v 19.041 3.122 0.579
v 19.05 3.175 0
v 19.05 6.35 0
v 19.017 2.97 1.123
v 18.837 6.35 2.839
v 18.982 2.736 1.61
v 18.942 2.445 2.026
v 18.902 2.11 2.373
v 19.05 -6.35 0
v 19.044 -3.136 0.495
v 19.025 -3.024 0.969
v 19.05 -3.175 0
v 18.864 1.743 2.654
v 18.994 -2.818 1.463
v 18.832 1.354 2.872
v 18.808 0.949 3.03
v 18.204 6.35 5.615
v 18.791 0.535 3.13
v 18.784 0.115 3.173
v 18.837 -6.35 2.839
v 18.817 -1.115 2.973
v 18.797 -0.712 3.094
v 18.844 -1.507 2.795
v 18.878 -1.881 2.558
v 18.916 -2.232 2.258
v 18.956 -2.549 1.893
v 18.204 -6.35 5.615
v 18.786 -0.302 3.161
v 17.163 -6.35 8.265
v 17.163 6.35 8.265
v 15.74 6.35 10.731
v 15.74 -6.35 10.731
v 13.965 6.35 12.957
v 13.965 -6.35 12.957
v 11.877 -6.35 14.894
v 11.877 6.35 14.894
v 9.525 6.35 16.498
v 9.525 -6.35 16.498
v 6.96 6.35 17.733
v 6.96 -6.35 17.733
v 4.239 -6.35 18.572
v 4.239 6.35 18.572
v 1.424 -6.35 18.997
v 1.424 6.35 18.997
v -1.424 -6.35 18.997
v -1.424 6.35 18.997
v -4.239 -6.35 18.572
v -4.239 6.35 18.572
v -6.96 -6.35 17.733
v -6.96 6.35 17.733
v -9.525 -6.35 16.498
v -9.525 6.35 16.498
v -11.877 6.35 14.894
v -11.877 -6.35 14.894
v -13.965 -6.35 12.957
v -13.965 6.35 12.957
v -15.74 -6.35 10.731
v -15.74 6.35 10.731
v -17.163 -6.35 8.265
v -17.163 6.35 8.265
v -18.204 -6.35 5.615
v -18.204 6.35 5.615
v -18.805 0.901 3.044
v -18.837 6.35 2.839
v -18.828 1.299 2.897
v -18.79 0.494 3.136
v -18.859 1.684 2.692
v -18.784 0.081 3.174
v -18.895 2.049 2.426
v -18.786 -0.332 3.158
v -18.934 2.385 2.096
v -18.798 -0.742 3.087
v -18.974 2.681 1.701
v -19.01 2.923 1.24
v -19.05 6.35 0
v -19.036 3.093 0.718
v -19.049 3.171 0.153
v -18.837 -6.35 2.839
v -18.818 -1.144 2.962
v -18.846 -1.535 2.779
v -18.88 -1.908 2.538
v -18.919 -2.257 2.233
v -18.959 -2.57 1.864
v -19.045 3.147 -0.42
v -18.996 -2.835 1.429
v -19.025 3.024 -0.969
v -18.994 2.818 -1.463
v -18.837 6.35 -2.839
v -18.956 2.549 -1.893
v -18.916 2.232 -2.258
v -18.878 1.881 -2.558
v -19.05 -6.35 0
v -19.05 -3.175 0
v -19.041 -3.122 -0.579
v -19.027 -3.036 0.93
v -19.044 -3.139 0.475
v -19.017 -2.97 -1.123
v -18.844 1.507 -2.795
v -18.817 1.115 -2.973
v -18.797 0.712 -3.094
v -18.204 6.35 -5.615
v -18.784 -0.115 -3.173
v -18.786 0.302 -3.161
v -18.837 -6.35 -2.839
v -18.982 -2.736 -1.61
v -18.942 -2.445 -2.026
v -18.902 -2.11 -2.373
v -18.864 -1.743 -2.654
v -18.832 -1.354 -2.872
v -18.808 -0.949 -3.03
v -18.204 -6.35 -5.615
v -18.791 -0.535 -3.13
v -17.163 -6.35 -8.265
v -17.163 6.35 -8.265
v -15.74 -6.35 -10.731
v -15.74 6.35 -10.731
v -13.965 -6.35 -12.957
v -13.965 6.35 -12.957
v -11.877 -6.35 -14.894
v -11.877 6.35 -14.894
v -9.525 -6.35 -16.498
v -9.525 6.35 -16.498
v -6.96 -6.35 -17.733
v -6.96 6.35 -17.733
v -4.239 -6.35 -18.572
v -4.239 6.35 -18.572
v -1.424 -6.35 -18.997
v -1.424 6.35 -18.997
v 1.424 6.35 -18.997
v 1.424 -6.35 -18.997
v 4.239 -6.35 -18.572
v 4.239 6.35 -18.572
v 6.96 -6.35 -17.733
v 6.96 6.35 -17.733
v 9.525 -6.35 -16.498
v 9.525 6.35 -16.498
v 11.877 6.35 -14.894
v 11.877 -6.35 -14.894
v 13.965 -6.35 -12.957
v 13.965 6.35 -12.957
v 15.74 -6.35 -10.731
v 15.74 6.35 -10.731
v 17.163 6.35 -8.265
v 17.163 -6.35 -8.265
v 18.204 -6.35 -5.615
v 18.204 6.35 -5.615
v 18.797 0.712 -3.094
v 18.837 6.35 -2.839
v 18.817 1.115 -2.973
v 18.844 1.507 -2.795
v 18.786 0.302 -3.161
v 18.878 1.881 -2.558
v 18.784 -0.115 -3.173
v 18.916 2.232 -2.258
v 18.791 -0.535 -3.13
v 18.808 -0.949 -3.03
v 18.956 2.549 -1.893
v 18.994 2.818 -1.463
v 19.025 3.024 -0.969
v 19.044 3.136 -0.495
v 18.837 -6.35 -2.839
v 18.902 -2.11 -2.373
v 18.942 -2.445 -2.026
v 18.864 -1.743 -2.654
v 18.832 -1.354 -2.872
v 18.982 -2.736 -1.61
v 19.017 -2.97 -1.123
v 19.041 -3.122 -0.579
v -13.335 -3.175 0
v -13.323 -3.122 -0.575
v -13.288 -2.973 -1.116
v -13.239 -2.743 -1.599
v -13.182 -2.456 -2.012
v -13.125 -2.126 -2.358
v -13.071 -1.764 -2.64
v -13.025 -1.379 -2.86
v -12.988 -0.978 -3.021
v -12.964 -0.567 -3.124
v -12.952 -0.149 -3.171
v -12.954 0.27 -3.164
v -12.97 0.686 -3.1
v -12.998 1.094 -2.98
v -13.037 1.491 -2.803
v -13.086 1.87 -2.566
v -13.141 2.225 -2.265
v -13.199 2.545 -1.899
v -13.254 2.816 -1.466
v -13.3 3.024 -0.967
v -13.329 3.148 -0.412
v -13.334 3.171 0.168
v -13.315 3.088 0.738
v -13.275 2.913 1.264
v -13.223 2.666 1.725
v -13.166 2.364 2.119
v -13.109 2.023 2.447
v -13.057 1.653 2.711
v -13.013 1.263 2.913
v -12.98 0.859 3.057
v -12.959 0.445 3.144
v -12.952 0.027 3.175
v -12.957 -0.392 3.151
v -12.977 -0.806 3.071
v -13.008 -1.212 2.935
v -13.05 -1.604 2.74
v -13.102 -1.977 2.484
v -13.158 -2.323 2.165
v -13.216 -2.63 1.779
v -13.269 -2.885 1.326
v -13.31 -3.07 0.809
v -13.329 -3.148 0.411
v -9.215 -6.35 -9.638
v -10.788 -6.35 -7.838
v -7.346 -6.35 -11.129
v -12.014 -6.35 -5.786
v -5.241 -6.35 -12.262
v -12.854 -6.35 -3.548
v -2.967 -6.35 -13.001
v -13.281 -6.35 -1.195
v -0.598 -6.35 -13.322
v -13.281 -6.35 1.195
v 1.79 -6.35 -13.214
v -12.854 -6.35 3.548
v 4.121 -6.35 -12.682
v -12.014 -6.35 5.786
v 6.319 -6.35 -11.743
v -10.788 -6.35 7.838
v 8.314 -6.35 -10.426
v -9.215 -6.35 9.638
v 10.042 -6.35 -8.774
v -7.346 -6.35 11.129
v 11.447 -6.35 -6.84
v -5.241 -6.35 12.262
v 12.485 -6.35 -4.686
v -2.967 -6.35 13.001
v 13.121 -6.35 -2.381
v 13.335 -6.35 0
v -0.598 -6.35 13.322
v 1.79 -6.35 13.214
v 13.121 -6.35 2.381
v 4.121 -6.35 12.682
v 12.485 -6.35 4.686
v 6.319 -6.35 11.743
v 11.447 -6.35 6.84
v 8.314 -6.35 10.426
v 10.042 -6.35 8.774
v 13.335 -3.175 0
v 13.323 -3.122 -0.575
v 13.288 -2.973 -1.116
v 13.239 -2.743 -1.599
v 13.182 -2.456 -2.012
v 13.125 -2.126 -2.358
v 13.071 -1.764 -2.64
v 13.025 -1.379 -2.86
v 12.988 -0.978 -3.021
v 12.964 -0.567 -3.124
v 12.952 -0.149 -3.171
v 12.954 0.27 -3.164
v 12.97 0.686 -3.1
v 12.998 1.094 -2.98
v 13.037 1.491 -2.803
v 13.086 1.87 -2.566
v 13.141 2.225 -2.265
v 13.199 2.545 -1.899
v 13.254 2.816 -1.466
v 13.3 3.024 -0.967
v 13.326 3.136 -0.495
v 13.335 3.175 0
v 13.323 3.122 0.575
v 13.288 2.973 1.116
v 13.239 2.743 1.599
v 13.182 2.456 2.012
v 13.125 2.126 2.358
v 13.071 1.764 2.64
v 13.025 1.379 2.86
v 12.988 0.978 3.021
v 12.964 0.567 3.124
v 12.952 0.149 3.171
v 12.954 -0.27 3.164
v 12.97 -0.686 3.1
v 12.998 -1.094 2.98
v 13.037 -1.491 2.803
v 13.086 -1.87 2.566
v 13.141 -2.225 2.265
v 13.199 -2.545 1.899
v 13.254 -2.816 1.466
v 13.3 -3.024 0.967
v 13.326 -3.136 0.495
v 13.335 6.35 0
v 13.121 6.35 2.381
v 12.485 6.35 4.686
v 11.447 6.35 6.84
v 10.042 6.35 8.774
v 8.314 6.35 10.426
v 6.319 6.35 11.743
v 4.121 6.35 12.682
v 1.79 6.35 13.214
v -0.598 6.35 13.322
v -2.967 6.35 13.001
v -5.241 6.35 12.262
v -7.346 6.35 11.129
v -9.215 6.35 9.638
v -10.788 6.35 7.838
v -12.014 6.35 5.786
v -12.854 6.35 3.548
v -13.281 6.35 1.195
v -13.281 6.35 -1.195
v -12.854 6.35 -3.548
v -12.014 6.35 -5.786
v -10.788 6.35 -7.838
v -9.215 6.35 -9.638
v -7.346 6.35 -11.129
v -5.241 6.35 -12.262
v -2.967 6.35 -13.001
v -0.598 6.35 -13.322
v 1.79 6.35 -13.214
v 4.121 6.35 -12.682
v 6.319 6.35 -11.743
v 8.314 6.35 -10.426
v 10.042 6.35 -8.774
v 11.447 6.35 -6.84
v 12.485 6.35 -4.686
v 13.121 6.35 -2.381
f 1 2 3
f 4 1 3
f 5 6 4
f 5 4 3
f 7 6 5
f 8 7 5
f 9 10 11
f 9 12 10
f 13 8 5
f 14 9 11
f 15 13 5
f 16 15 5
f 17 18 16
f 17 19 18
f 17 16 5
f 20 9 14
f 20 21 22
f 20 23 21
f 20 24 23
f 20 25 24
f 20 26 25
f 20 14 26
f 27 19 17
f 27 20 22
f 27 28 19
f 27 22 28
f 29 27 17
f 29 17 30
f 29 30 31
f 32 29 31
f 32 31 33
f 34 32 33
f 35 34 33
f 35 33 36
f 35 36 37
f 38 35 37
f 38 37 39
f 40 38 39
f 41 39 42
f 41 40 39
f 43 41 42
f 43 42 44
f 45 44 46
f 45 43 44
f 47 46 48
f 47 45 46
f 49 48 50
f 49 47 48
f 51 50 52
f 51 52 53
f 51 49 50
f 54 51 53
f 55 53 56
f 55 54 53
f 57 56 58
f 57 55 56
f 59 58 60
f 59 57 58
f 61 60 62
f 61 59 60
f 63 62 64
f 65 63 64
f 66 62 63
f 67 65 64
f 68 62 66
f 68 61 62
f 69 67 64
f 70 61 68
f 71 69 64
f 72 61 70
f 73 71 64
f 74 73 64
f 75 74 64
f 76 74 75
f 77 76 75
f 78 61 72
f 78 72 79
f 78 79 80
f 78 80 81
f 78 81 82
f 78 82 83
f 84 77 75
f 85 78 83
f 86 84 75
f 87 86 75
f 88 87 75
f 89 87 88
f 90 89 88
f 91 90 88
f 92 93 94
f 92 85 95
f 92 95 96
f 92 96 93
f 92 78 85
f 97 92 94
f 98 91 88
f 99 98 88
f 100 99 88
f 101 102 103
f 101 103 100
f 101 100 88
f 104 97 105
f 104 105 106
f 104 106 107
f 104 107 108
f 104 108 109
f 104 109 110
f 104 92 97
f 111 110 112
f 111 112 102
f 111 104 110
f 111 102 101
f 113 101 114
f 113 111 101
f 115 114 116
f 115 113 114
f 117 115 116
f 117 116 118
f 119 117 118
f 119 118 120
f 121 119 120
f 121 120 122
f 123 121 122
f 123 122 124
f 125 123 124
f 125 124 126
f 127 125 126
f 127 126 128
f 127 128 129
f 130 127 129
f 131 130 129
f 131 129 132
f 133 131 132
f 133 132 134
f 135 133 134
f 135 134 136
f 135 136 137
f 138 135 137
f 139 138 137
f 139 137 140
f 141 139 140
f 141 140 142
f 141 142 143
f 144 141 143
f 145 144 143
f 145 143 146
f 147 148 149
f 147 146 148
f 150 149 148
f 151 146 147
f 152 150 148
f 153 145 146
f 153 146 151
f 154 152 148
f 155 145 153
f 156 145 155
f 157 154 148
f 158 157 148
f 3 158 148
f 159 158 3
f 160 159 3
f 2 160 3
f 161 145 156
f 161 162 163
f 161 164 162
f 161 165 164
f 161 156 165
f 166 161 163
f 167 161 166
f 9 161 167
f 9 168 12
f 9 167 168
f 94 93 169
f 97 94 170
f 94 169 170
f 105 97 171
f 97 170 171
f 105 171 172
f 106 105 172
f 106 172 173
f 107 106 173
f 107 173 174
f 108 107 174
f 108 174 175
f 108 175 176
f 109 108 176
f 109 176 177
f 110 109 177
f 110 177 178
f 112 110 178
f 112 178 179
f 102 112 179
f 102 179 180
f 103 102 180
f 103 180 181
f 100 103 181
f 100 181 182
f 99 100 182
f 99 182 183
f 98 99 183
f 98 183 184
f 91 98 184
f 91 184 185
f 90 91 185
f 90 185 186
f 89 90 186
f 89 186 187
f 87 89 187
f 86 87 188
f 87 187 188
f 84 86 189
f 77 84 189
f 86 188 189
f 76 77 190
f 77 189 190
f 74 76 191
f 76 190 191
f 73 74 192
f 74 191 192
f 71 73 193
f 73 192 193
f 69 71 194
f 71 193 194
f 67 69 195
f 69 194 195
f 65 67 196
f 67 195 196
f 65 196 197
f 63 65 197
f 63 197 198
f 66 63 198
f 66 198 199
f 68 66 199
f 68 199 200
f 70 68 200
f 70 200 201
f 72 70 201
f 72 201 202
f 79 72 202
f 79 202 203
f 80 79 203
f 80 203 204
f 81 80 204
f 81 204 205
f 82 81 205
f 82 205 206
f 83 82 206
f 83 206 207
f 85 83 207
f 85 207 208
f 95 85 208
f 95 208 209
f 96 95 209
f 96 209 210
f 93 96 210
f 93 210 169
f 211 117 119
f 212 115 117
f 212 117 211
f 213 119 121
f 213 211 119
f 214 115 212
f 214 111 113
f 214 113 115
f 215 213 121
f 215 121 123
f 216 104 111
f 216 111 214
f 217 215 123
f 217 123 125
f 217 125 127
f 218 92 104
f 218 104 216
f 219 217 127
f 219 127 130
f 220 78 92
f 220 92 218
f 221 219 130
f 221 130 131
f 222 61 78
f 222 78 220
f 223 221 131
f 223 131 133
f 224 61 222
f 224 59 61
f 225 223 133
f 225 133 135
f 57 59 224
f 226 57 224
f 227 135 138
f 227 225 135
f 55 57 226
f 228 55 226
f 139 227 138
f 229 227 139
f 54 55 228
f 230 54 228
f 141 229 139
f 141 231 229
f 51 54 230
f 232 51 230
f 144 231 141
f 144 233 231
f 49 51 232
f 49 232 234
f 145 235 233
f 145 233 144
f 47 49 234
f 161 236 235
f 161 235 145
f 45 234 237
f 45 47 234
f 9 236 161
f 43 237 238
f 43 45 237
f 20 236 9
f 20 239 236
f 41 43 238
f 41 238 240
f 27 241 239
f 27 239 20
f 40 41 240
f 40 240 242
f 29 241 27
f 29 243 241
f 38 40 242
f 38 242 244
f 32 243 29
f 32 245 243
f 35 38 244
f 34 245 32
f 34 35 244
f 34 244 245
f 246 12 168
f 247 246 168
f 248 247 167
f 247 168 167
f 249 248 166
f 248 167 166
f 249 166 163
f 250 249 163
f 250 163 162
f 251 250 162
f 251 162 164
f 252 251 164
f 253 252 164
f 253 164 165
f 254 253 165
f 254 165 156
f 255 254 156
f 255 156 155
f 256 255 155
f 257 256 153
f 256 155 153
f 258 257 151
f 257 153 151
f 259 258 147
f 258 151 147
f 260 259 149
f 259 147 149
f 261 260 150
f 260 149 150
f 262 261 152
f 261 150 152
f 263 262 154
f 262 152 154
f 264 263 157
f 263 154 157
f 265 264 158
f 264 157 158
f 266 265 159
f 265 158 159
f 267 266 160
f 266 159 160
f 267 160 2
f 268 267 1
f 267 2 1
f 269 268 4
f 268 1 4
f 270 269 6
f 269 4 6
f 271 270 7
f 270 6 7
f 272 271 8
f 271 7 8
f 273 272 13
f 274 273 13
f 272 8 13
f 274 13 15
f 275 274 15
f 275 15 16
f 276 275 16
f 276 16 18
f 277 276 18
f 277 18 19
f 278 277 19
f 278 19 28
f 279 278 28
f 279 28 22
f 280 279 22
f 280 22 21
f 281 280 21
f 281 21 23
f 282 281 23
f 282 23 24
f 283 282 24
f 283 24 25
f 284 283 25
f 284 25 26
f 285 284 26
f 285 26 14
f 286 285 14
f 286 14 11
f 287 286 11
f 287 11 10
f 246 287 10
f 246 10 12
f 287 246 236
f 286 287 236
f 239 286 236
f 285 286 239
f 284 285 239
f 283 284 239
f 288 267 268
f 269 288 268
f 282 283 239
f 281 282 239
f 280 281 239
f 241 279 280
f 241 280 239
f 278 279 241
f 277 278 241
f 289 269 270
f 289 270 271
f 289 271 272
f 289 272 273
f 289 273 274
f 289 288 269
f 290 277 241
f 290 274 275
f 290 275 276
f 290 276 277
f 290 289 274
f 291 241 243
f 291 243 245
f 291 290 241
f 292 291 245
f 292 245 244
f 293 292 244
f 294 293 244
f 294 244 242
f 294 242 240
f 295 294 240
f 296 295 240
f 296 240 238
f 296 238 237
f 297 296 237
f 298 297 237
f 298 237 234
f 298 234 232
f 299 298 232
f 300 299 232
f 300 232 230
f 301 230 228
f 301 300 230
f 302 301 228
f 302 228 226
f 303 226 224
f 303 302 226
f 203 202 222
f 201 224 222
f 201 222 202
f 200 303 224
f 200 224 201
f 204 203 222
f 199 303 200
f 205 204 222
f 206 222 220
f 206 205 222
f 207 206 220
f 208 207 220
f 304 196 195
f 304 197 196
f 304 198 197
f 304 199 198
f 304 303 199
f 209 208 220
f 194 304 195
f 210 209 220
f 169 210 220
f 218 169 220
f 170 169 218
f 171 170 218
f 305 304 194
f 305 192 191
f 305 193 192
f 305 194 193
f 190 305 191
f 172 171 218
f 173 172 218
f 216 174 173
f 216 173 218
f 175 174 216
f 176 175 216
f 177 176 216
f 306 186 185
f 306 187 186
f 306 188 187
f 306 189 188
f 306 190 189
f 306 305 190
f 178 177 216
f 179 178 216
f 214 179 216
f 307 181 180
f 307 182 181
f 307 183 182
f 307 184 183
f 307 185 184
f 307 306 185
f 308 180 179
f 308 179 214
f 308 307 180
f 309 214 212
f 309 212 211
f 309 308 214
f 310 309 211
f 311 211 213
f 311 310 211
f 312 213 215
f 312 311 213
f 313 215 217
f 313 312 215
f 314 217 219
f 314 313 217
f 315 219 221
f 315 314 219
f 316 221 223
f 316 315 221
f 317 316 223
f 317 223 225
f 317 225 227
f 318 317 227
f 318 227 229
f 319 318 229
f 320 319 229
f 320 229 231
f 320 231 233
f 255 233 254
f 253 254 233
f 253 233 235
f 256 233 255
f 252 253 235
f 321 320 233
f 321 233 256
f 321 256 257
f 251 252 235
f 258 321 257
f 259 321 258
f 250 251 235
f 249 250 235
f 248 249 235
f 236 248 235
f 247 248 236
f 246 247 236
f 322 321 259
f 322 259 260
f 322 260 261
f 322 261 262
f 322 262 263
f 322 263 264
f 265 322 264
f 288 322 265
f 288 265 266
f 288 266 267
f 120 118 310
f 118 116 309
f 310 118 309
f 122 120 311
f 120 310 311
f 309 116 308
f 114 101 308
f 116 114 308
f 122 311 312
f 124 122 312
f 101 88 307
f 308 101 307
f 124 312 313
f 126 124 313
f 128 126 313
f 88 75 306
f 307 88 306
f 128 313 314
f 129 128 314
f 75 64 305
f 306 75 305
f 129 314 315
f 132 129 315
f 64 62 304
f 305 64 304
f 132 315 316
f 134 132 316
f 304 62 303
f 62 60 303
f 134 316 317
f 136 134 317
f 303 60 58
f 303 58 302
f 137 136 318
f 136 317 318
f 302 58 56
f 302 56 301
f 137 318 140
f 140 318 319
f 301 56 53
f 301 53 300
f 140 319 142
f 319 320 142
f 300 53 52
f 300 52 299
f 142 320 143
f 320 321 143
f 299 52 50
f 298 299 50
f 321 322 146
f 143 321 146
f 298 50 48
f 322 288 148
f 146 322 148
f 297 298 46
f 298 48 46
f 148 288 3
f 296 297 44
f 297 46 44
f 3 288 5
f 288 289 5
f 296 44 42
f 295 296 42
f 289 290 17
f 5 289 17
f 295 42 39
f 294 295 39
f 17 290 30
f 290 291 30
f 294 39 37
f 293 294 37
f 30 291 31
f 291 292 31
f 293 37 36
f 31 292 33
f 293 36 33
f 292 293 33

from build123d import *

# Parameters (mm, degrees)
F0_R     = 19.05
F0_R_2   = 13.335
F1_DEPTH = 6.35
F3_D     = 6.35
F4_D     = 6.35


with BuildPart() as f1:
    # F0 (on Front) → F1 (new body, symmetric)
    with BuildSketch(Plane.XZ):
        Circle(F0_R)
        Circle(F0_R_2, mode=Mode.SUBTRACT)
    extrude(amount=F1_DEPTH, both=True)

    # F3 (through all)
    with Locations(Plane(origin=(0, 0, 0), x_dir=(0, 1, 0), z_dir=(-1, 0, 0))):
        with Locations((0, 0)):
            Hole(F3_D / 2)

    # F4 (through all)
    with Locations(Plane.YZ):
        with Locations((0, 0)):
            Hole(F4_D / 2)


solid = f1.part
